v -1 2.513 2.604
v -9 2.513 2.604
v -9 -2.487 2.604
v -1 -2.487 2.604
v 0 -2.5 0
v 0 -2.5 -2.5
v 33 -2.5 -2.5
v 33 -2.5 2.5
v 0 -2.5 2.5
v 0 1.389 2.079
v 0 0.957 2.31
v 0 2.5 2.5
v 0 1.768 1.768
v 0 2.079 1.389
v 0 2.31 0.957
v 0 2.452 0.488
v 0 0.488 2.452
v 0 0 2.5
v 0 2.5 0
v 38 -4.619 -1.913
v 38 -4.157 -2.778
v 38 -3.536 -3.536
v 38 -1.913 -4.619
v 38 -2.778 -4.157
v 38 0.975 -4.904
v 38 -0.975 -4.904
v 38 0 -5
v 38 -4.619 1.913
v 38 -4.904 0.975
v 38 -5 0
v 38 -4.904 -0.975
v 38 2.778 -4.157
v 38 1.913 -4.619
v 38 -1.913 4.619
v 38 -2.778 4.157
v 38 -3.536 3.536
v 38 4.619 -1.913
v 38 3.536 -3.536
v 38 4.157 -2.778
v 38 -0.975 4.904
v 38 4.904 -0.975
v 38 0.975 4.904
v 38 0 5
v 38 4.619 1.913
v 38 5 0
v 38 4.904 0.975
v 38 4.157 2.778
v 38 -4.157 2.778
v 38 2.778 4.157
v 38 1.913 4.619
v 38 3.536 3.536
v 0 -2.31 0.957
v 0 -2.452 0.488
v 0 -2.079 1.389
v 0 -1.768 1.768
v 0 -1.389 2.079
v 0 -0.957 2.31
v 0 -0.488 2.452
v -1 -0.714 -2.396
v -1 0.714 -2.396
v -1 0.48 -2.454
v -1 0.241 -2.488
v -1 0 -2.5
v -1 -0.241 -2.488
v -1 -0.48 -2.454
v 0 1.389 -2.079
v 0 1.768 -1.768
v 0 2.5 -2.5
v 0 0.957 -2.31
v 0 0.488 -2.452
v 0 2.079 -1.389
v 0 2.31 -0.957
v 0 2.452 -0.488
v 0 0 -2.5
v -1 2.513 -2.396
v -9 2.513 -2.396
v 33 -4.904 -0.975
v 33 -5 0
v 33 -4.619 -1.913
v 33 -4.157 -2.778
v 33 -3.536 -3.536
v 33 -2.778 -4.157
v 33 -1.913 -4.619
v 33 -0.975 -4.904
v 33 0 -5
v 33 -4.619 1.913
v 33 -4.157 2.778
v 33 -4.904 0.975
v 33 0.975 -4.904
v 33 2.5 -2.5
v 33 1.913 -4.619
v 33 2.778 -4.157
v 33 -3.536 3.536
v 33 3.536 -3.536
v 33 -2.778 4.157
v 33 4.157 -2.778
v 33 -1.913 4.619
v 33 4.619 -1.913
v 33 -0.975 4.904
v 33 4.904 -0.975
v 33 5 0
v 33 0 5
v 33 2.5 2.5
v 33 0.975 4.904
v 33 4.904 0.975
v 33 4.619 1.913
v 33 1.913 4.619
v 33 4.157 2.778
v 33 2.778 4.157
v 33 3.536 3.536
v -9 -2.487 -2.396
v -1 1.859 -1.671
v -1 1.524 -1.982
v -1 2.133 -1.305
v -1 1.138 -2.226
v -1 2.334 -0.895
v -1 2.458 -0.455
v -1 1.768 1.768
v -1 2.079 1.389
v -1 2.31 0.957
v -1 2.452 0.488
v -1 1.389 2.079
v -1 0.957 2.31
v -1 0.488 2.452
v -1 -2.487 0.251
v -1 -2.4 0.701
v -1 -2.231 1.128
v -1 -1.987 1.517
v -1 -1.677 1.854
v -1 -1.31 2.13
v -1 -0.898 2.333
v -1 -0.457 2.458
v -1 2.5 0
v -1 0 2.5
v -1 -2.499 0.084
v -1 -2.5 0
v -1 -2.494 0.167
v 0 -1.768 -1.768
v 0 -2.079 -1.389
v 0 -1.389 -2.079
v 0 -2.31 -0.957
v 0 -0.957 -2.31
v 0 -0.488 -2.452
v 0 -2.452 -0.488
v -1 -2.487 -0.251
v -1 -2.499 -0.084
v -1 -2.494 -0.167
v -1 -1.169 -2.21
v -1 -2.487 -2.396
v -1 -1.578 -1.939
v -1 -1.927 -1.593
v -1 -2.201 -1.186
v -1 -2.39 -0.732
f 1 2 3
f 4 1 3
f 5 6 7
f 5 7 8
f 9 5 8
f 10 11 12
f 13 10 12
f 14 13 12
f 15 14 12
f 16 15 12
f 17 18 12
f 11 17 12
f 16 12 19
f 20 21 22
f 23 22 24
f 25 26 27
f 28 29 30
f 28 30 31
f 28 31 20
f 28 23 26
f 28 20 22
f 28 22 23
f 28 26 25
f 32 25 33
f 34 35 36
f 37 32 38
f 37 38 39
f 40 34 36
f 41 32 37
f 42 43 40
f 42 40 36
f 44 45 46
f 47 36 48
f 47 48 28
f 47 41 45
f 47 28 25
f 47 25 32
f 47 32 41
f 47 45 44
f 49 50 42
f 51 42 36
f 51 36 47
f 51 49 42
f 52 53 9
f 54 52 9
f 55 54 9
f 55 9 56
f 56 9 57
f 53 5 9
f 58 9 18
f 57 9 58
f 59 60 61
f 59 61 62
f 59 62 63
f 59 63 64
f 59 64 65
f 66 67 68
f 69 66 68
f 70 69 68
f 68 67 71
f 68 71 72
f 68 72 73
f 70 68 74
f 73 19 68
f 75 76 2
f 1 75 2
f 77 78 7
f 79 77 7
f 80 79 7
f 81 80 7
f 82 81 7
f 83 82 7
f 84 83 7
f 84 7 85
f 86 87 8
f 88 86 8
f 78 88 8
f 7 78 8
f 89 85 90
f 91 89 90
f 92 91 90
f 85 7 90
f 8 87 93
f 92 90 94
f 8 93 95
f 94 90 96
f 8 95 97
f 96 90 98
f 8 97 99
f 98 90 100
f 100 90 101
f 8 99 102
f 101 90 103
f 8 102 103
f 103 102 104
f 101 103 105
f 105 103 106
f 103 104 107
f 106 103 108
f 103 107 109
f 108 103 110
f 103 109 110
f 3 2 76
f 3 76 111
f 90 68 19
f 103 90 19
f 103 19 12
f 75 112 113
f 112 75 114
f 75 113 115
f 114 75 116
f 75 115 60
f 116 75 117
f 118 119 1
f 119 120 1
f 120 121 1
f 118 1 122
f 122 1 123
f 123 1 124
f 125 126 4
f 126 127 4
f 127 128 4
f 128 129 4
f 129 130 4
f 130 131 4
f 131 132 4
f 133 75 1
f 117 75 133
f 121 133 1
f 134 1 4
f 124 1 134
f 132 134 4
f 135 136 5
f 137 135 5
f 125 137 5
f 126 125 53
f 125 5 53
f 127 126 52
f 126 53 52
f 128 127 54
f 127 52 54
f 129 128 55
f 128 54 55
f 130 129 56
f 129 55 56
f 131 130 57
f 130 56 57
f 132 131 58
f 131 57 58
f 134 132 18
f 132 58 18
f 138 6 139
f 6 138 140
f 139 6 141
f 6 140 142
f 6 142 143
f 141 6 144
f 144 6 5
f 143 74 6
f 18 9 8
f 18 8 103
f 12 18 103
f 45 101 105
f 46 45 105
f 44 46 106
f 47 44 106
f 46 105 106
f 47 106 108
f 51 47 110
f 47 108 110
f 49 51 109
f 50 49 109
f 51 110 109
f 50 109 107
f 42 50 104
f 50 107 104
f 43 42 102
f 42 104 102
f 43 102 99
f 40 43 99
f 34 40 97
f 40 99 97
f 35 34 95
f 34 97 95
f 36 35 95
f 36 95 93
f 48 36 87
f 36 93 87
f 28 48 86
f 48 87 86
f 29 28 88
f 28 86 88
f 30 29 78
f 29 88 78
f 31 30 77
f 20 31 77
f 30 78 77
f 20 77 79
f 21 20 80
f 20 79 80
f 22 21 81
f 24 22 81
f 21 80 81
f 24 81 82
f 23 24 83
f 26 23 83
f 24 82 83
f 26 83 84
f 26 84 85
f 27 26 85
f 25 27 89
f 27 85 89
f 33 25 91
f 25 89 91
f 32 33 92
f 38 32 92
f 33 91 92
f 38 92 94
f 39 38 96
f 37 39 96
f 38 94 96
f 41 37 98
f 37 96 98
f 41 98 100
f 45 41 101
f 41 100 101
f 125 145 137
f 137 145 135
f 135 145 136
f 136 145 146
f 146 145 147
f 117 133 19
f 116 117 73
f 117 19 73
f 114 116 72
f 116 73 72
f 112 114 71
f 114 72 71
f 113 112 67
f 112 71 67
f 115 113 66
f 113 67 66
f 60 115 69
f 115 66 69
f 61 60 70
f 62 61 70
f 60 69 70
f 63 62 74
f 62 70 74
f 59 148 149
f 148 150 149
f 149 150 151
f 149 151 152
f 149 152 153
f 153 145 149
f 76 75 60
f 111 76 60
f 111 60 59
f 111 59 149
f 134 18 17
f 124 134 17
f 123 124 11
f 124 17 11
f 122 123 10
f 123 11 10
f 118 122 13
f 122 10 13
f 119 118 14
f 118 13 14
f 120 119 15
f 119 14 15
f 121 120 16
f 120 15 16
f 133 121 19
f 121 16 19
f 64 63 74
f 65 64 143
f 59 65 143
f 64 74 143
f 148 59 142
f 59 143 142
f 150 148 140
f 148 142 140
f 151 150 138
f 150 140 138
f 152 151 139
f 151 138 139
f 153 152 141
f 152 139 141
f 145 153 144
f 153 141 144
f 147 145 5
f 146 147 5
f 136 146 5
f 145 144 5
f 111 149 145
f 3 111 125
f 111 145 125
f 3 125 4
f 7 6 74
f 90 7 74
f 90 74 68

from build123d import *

# Parameters (mm, degrees)
F0_W     = 5
F0_H     = 5
F1_DEPTH = 33
F2_R     = 5
F3_DEPTH = 5
F5_DEPTH = 1
F7_W     = 5
F7_H     = 5
F8_DEPTH = 8


with BuildPart() as f1:
    # F0 (on Right) → F1 (new body)
    with BuildSketch(Plane.YZ):
        Rectangle(F0_W, F0_H)
    extrude(amount=F1_DEPTH)

    # F2 (on face) → F3 (join)
    with BuildSketch(Plane.YZ.offset(33)):
        Circle(F2_R)
    extrude(amount=F3_DEPTH)

    # F4 (on face) → F5 (join)
    with BuildSketch(Plane(origin=(0, 0, 0), x_dir=(0, -1, 0), z_dir=(-1, 0, 0))):
        with BuildLine():
            ThreePointArc((0, -2.5), (1.767767, -1.767767), (2.5, 0))
            ThreePointArc((2.5, 0), (1.767767, 1.767767), (0, 2.5))
            ThreePointArc((0, 2.5), (-1.767767, 1.767767), (-2.5, 0))
            ThreePointArc((-2.5, 0), (-1.767767, -1.767767), (0, -2.5))
        make_face()
    extrude(amount=F5_DEPTH)

    # F7 (on face) → F8 (join)
    with BuildSketch(Plane(origin=(-1, 0, 0), x_dir=(0, -1, 0), z_dir=(-1, 0, 0))):
        with Locations((-0.012615, 0.104109)):
            Rectangle(F7_W, F7_H)
    extrude(amount=F8_DEPTH)


solid = f1.part
